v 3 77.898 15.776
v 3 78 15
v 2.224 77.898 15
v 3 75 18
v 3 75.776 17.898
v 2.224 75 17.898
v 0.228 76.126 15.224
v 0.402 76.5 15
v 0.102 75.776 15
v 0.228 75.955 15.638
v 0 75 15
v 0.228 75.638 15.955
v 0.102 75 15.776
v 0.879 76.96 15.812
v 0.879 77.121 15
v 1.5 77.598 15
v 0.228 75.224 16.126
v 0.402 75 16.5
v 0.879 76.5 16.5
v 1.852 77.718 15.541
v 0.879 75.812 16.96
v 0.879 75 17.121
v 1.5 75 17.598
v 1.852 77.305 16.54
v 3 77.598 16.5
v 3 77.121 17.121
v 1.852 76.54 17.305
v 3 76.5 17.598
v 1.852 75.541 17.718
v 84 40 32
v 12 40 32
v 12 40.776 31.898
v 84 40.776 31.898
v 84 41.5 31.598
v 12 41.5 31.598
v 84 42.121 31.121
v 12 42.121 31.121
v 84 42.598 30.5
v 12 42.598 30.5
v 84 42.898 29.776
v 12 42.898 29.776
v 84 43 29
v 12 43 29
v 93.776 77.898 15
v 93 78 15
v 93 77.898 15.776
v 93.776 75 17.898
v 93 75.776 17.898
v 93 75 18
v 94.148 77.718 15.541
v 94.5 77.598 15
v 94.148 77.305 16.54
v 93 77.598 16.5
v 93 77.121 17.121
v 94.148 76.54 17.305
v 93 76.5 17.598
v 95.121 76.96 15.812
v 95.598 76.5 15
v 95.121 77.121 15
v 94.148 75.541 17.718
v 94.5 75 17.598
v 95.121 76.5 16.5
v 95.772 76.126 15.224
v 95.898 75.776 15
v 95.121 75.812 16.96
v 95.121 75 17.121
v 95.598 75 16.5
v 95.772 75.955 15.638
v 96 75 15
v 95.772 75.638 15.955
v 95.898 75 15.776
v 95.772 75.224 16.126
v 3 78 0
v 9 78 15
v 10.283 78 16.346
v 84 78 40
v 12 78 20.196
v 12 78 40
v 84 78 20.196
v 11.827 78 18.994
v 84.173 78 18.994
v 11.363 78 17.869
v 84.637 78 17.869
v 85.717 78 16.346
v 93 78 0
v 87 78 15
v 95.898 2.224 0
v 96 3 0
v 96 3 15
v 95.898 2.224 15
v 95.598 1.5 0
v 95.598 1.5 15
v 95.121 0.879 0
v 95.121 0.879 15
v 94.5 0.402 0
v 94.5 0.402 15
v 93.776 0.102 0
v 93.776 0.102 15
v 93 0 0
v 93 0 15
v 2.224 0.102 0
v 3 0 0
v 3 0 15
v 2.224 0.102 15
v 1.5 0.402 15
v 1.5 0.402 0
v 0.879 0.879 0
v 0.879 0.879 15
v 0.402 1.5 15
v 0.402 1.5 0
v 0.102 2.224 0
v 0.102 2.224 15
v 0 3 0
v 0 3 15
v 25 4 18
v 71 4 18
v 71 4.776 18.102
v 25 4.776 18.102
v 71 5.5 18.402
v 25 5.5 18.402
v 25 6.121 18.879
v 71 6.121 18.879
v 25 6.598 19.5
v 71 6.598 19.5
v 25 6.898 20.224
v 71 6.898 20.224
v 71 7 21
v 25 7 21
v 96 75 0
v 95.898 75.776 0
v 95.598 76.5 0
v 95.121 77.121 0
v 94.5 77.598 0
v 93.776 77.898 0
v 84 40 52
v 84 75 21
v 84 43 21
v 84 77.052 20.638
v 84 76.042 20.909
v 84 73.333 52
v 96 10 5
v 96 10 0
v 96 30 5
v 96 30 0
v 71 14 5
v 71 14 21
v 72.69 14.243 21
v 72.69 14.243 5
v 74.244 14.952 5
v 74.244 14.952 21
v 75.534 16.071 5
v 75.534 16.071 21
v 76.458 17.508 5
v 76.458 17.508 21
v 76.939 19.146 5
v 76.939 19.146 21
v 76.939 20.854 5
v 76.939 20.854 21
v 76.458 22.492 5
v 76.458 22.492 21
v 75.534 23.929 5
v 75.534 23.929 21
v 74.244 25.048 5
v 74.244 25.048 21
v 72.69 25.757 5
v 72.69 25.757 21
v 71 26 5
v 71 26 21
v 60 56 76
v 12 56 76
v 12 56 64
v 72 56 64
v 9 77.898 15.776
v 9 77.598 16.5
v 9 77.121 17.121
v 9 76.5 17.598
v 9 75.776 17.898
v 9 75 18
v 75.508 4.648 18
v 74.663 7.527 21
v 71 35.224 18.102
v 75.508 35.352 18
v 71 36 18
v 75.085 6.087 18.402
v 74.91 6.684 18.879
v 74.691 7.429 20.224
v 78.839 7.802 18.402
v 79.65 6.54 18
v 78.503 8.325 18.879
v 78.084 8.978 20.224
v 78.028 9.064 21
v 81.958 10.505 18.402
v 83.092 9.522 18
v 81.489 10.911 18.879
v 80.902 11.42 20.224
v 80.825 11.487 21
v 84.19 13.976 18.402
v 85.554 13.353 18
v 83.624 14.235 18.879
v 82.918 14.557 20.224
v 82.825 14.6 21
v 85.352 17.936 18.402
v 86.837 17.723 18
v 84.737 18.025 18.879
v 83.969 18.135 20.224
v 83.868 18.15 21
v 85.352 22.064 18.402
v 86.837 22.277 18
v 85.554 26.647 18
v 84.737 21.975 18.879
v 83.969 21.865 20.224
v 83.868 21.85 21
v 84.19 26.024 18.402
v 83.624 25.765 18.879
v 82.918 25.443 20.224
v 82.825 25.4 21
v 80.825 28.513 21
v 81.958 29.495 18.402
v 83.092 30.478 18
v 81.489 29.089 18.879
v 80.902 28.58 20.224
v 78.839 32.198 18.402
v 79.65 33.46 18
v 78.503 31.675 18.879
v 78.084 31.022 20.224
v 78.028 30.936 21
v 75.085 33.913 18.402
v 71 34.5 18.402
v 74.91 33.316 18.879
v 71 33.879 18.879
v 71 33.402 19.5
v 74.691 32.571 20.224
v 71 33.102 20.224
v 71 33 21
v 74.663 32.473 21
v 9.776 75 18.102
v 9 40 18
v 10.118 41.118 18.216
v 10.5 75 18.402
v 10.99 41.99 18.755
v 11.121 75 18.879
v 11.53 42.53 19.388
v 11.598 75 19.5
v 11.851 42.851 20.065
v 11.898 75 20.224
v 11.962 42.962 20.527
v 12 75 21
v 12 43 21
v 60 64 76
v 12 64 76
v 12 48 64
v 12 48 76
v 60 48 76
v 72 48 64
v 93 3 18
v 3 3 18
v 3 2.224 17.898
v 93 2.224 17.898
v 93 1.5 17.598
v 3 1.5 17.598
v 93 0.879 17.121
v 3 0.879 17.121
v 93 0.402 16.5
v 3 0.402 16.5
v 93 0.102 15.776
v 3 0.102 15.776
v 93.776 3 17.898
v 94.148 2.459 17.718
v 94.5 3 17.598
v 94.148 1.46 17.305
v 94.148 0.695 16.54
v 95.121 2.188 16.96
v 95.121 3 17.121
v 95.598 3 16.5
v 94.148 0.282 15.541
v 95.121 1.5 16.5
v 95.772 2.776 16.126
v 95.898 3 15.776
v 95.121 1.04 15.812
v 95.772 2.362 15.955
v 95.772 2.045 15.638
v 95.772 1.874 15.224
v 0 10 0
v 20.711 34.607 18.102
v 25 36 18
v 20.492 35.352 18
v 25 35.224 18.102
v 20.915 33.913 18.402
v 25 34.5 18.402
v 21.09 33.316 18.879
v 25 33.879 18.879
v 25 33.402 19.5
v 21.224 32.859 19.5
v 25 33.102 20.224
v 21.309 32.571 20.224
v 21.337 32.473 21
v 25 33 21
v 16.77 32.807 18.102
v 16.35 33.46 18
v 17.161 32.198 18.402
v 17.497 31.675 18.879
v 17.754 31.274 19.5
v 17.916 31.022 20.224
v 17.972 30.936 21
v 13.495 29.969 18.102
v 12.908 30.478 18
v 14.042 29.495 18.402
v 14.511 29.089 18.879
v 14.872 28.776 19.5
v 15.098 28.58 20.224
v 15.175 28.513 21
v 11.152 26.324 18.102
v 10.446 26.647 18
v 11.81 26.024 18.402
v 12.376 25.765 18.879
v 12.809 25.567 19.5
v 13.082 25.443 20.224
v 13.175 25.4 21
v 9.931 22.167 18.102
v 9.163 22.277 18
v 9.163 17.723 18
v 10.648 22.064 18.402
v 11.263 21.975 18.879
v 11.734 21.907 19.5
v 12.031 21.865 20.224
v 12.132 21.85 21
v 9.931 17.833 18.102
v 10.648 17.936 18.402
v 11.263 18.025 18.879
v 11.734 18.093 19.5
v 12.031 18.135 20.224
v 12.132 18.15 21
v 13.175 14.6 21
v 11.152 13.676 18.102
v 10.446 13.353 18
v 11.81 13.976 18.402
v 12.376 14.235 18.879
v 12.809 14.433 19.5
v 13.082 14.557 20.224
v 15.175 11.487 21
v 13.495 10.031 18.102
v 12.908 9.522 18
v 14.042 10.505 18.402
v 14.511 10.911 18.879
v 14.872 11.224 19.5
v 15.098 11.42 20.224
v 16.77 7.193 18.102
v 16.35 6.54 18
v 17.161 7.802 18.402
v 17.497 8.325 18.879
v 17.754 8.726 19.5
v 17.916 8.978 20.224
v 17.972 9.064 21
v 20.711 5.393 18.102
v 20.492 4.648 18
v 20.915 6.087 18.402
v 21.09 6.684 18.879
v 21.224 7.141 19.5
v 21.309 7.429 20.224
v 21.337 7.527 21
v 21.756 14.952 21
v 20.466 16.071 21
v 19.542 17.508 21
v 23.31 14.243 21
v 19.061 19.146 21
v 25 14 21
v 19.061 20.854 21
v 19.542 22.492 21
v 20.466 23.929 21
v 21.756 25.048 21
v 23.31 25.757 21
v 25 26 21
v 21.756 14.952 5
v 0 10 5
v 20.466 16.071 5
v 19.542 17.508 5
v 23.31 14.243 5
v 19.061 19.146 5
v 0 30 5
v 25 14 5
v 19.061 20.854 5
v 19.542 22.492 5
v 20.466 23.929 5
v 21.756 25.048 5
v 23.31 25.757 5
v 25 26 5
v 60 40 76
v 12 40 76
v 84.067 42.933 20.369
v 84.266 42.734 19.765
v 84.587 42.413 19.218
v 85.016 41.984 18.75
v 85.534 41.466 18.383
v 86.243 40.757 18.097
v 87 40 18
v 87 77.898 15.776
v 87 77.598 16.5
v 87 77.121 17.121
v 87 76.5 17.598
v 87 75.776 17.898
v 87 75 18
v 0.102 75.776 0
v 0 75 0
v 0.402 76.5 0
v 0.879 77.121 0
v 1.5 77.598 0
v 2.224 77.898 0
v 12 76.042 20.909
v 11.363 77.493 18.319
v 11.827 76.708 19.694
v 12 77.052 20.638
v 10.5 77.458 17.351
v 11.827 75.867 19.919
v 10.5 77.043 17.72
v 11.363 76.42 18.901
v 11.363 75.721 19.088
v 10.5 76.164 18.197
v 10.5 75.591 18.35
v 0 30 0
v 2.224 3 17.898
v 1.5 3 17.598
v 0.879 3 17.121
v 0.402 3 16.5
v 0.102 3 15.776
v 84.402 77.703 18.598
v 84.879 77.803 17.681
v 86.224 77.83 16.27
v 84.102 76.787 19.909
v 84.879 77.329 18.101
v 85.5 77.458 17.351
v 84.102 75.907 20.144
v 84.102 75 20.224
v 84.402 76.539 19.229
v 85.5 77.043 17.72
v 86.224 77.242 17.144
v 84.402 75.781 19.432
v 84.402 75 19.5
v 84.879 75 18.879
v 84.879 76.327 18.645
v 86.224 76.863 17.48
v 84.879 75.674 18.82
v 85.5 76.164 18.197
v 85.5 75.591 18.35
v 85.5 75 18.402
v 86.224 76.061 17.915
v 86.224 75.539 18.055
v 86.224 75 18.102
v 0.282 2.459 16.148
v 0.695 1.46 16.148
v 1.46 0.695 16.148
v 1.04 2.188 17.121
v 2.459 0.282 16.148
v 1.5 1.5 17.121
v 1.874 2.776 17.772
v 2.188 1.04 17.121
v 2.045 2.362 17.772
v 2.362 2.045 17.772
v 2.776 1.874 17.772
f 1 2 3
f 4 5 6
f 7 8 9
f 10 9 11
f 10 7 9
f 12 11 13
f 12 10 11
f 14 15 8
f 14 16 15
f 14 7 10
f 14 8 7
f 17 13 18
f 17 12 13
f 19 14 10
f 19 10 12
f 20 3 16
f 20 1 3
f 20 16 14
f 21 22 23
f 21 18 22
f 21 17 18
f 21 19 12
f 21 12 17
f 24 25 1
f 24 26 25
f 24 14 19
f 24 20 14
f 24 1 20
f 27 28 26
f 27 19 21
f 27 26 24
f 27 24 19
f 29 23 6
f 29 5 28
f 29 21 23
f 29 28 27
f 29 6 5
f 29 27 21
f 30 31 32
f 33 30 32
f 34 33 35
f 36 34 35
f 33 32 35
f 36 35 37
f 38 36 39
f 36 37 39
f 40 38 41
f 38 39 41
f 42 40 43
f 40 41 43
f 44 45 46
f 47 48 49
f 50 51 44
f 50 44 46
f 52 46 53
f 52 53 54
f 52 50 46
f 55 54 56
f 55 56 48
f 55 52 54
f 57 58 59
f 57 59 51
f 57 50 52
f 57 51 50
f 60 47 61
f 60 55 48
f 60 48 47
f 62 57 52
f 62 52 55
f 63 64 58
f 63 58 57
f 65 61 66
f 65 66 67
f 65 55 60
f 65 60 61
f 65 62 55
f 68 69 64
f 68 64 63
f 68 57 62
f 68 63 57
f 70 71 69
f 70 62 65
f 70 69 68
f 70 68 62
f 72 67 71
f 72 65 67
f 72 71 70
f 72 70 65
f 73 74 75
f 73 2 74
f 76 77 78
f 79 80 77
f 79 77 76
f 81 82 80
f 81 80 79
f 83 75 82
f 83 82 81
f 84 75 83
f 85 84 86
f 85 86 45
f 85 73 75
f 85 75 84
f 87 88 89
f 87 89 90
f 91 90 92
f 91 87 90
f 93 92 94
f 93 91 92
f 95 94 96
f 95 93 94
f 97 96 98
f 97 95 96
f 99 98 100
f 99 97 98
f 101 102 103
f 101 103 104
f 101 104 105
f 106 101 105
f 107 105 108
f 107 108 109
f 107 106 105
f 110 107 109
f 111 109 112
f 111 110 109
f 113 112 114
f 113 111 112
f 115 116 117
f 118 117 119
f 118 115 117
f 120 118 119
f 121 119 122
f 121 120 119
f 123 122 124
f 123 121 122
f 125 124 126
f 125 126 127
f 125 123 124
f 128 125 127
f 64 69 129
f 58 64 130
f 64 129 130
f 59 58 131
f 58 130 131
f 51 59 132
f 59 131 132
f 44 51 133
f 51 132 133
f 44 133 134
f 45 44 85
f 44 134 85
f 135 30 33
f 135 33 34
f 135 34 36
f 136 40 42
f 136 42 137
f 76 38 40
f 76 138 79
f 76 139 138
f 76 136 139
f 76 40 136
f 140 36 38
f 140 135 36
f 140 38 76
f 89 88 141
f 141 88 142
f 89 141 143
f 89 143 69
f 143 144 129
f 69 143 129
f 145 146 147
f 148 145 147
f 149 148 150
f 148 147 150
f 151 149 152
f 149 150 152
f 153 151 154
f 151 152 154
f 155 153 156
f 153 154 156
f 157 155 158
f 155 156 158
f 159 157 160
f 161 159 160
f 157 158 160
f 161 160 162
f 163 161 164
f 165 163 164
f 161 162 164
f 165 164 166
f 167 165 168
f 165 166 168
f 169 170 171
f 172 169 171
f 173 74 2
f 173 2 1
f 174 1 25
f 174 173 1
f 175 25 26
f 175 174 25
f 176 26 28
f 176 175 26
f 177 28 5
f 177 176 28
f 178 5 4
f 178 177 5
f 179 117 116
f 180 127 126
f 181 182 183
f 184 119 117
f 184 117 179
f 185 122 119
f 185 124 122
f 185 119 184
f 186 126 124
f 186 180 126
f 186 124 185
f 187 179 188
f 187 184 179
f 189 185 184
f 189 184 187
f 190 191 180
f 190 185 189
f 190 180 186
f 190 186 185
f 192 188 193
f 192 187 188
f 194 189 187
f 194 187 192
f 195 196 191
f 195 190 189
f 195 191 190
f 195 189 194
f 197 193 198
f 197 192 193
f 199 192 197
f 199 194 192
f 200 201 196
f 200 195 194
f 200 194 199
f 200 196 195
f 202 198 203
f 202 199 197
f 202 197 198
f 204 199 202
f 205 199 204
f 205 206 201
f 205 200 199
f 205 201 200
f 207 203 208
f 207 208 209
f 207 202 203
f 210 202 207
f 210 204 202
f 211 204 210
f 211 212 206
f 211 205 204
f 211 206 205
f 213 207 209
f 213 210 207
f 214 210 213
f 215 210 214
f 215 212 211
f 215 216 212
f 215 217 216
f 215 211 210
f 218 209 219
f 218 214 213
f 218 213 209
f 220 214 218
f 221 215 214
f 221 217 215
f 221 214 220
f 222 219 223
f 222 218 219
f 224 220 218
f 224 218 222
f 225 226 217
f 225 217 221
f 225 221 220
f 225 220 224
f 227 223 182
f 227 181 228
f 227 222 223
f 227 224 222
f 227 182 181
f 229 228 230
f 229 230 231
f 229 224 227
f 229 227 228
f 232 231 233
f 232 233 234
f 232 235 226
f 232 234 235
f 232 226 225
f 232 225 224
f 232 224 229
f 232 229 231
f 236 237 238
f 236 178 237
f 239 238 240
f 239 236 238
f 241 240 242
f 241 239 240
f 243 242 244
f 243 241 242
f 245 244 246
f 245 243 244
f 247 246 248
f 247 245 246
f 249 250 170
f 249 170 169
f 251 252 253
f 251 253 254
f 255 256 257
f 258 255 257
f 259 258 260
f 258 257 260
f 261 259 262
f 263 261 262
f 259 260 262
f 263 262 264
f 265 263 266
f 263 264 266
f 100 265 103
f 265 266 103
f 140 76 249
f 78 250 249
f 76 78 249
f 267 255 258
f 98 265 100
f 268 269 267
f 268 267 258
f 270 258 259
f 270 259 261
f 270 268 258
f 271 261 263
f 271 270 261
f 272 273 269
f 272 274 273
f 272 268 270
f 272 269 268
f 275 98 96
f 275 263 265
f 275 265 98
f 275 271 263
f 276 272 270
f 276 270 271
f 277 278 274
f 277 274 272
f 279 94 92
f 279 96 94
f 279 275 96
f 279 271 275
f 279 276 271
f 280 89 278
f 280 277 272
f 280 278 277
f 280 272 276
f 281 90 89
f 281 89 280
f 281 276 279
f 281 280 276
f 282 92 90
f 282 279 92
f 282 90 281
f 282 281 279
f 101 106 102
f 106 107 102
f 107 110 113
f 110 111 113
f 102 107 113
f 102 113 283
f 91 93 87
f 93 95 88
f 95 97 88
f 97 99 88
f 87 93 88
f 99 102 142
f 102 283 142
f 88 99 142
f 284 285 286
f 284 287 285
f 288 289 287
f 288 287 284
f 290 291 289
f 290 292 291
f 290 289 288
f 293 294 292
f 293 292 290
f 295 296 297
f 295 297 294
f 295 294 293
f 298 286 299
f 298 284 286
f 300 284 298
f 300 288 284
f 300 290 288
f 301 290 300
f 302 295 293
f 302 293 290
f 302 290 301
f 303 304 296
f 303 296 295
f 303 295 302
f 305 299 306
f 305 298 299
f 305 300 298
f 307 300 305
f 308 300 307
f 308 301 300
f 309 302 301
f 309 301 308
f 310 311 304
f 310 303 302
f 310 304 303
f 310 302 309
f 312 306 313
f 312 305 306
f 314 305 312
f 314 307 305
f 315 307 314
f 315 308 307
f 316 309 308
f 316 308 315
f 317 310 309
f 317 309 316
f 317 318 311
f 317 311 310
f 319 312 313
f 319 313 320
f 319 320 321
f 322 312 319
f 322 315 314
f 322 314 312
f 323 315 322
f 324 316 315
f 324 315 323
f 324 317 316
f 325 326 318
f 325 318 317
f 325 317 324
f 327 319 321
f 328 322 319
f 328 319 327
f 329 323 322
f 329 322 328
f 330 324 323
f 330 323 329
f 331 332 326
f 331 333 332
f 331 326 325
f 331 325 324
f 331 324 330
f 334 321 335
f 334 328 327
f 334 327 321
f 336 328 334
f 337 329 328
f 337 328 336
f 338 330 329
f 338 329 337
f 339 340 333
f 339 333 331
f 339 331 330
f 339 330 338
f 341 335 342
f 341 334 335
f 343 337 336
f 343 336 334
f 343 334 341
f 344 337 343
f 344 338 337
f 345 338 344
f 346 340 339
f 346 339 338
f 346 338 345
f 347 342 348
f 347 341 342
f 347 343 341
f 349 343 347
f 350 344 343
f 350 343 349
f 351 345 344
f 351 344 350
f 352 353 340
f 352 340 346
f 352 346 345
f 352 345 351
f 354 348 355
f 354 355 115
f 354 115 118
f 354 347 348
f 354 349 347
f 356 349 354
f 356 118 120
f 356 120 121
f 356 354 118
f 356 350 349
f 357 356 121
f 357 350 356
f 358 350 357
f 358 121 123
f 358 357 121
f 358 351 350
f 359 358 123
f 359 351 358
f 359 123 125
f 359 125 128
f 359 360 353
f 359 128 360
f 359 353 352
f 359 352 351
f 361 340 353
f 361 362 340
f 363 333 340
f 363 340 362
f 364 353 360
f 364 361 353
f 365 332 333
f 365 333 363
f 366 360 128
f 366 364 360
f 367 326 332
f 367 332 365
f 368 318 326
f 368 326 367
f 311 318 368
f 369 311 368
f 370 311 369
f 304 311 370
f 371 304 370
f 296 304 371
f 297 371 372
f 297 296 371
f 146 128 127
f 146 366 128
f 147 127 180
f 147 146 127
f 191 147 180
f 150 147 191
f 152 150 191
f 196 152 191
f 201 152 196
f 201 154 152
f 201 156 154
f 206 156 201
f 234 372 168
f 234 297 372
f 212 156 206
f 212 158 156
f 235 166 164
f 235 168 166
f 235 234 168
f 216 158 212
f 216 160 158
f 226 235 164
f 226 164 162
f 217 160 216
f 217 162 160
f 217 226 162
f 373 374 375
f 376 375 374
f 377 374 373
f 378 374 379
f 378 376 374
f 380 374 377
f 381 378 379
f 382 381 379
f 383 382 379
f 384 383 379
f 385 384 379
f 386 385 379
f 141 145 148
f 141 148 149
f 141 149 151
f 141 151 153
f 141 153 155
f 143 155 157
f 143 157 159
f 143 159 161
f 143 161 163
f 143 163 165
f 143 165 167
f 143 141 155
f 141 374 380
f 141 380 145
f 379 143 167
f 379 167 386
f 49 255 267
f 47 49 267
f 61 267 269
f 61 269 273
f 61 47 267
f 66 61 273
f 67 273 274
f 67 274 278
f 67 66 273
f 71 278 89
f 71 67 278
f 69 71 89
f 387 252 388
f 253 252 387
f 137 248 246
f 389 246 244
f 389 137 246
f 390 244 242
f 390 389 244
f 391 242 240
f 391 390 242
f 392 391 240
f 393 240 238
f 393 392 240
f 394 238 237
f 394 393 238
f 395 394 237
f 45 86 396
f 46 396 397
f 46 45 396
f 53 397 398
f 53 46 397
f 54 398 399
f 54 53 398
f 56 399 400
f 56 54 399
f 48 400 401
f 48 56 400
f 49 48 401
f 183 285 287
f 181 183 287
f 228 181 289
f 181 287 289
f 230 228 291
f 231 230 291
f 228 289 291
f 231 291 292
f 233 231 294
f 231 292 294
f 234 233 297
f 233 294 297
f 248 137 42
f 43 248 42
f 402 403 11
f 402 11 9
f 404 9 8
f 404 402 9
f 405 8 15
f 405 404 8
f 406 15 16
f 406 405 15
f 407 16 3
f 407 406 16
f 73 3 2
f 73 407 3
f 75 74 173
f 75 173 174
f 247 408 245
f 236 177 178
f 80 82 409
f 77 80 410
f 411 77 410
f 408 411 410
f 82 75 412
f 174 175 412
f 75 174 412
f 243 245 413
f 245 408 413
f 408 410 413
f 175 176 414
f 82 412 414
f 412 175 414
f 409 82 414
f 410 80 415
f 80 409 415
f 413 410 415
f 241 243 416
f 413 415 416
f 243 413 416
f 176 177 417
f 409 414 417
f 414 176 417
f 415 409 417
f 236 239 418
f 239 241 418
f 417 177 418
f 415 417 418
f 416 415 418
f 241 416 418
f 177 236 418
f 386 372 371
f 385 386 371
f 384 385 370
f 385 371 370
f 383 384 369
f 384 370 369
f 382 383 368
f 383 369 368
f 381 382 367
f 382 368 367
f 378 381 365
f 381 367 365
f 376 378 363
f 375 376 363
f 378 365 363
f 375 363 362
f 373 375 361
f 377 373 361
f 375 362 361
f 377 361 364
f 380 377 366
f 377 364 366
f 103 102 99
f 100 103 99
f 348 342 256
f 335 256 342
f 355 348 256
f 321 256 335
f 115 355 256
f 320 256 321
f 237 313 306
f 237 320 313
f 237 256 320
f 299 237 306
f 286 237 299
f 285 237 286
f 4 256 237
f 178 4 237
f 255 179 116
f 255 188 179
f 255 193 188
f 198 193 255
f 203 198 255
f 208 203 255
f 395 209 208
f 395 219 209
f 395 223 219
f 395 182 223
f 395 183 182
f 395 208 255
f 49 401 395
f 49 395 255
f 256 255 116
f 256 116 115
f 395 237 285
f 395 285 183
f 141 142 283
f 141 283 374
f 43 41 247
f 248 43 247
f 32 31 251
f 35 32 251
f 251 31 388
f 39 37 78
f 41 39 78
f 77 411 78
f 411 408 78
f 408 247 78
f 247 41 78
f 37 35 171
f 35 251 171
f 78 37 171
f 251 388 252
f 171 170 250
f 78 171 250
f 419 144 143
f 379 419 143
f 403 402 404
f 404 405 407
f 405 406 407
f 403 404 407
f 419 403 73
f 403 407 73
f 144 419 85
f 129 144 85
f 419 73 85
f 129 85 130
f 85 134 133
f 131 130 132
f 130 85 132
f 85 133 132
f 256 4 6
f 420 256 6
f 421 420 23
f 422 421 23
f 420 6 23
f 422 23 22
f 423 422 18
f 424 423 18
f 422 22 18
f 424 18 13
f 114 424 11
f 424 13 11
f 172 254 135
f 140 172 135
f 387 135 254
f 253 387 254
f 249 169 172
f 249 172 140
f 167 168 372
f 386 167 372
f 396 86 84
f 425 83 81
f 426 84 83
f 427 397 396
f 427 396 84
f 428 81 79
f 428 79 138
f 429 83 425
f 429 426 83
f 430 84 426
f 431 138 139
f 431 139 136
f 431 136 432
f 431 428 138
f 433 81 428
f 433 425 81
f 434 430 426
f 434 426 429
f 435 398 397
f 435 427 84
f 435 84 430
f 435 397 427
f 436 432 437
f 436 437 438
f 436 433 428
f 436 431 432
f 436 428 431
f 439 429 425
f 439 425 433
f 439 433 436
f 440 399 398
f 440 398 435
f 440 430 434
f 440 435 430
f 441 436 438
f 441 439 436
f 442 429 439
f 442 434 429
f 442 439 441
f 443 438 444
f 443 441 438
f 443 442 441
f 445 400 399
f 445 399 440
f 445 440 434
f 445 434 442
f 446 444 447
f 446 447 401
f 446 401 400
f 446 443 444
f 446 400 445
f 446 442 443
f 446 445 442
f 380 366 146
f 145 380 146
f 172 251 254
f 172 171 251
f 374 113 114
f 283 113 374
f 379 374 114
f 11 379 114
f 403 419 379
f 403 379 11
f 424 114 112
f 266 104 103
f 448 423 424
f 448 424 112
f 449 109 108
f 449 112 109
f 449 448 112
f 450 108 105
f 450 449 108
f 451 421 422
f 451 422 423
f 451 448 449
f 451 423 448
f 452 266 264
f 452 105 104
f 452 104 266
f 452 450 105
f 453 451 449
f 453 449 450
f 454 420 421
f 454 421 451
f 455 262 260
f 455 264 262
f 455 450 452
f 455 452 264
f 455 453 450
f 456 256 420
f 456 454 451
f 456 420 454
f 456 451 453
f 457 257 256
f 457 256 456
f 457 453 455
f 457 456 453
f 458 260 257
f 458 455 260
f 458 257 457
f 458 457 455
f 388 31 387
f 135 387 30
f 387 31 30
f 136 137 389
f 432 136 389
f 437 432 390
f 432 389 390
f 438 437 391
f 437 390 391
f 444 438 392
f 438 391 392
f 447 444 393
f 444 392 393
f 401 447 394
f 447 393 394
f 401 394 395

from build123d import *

# Parameters (mm, degrees)
F0_W          = 96
F0_H          = 78
F1_DEPTH      = 18
F2_W          = 72
F2_H          = 38
F3_DEPTH      = 58
F4_R          = 3
F5_W          = 72
F5_H          = 8
F6_DEPTH      = 12
F7_C1_SIZE    = 24
F8_SIZE2      = 14
F8_SIZE       = 36
F9_W          = 3
F9_H          = 14
F10_DEPTH     = 72
F11_W         = 20
F11_H         = 5
F12_DEPTH     = 96
F14_DEPTH     = 3
F16_DEPTH     = 16
F17_T1_DEPTH  = 72
F17_T3_DEPTH  = 32
F17_T5_DEPTH  = 46
F17_T8_ANGLE  = 180
F17_T10_ANGLE = 180
F17_T14_ANGLE = 233.2969892374
F17_T19_ANGLE = 233.2969892374
F17_T25_DEPTH = 39.5
F17_T29_DEPTH = 79.5
F17_T36_DEPTH = 79.5
F17_T40_DEPTH = 39.5
F17_T43_DEPTH = 22.5
F17_T45_DEPTH = 90
F17_T47_DEPTH = 72
F17_S51_W     = 3.06
F17_S51_H     = 3.06
F17_T52_DEPTH = 3.06
F17_S57_W     = 3.06
F17_S57_H     = 3.06
F17_T58_DEPTH = 3.06
F17_T62_ANGLE = 90
F17_T64_ANGLE = 90


# Not quite as in the source:
# - a fillet or chamfer that OpenCascade refuses, or shapes differently, is made with other operations: its cross-section is extruded or revolved along the edge and cut away or added


with BuildPart() as f1:
    # F0 (on Top) → F1 (new body)
    with BuildSketch(Plane.XY):
        with Locations((48, 39)):
            Rectangle(F0_W, F0_H)
    extrude(amount=F1_DEPTH)

    # F2 (on face) → F3 (join)
    with BuildSketch(Plane.XY.offset(18)):
        with Locations((48, 59)):
            Rectangle(F2_W, F2_H)
    extrude(amount=F3_DEPTH)

    # F4
    f4_edges = [f1.edges().sort_by_distance(p)[0] for p in [
        (90, 78, 18),
        (6, 78, 18),
    ]]
    fillet(f4_edges, radius=F4_R)

    # F5 (on face) → F6 (cut)
    with BuildSketch(Plane.XY.offset(76)):
        with Locations((48, 52)):
            Rectangle(F5_W, F5_H)
    extrude(amount=-F6_DEPTH, mode=Mode.SUBTRACT)

    # F7: chamfer of 24 on 2 edges, made by hand

    # F7_c1
    f7_c1_edges = [f1.edges().sort_by_distance(p)[0] for p in [
        (84, 44, 76),
    ]]
    chamfer(f7_c1_edges, length=F7_C1_SIZE)

    # F8
    f8_edges = [f1.edges().sort_by_distance(p)[0] for p in [
        (36, 78, 76),
    ]]
    f8_side = f1.faces().sort_by_distance((46.545455, 78, 34.461039))[0]
    chamfer(f8_edges, length=F8_SIZE, length2=F8_SIZE2, reference=f8_side)

    # F9 (on face) → F10 (cut, through all)
    with BuildSketch(Plane.YZ.offset(84)):
        with Locations((41.5, 25)):
            Rectangle(F9_W, F9_H)
    extrude(amount=-F10_DEPTH, mode=Mode.SUBTRACT)

    # F11 (on face) → F12 (cut, through all)
    with BuildSketch(Plane.YZ.offset(96)):
        with Locations((20, 2.5)):
            Rectangle(F11_W, F11_H)
    extrude(amount=-F12_DEPTH, mode=Mode.SUBTRACT)

    # F13 (on face) → F14 (join)
    with BuildSketch(Plane.XY.offset(18)):
        with BuildLine():
            ThreePointArc((71, 7), (84, 20), (71, 33))
            Line((71, 33), (25, 33))
            ThreePointArc((25, 33), (12, 20), (25, 7))
            Line((25, 7), (71, 7))
        make_face()
    extrude(amount=F14_DEPTH)

    # F15 (on face) → F16 (cut, through all)
    with BuildSketch(Plane.XY.offset(21)):
        with BuildLine():
            ThreePointArc((25, 26), (19, 20), (25, 14))
            Line((25, 14), (71, 14))
            ThreePointArc((71, 14), (77, 20), (71, 26))
            Line((71, 26), (25, 26))
        make_face()
    extrude(amount=-F16_DEPTH, mode=Mode.SUBTRACT)

    # F17: fillet of radius 3 on 17 edges, made by hand

    # F17_s2 → F17_t1 (join)
    with BuildSketch(Plane.YZ.offset(12)):
        with BuildLine():
            ThreePointArc((40, 32), (42.1213203436, 31.1213203436), (43, 29))
            Line((43, 29), (43, 32))
            Line((43, 32), (40, 32))
        make_face()
        with BuildLine():
            ThreePointArc((43, 21), (42.1213203436, 18.8786796564), (40, 18))
            Line((40, 18), (43, 18))
            Line((43, 18), (43, 21))
        make_face()
    extrude(amount=F17_T1_DEPTH)

    # F17_s4 → F17_t3 (join)
    with BuildSketch(Plane.XZ.offset(-75)):
        with BuildLine():
            ThreePointArc((84, 21), (84.8786796564, 18.8786796564), (87, 18))
            Line((87, 18), (84, 18))
            Line((84, 18), (84, 21))
        make_face()
        with BuildLine():
            ThreePointArc((9, 18), (11.1213203436, 18.8786796564), (12, 21))
            Line((12, 21), (12, 18))
            Line((12, 18), (9, 18))
        make_face()
    extrude(amount=F17_T3_DEPTH)

    # F17_s6 → F17_t5 (join)
    with BuildSketch(Plane.YZ.offset(25)):
        with BuildLine():
            ThreePointArc((4, 18), (6.1213203436, 18.8786796564), (7, 21))
            Line((7, 21), (7, 18))
            Line((7, 18), (4, 18))
        make_face()
        with BuildLine():
            ThreePointArc((36, 18), (33.8786796564, 18.8786796564), (33, 21))
            Line((33, 21), (33, 18))
            Line((33, 18), (36, 18))
        make_face()
    extrude(amount=F17_T5_DEPTH)

    # F17_s7 → F17_t8 (revolve)
    with BuildSketch(Plane.YZ.offset(25)):
        with BuildLine():
            ThreePointArc((36, 18), (33.8786796564, 18.8786796564), (33, 21))
            Line((33, 21), (33, 18))
            Line((33, 18), (36, 18))
        make_face()
    revolve(axis=Axis((25, 20, 18), (0, 0, 1)), revolution_arc=F17_T8_ANGLE)

    # F17_s9 → F17_t10 (revolve)
    with BuildSketch(Plane.YZ.offset(71)):
        with BuildLine():
            ThreePointArc((4, 18), (6.1213203436, 18.8786796564), (7, 21))
            Line((7, 21), (7, 18))
            Line((7, 18), (4, 18))
        make_face()
    revolve(axis=Axis((71, 20, 18), (0, 0, 1)), revolution_arc=F17_T10_ANGLE)


with BuildPart() as f17_tool12:
    # F17_s13 → F17_t14 (revolve)
    with BuildSketch(Plane(origin=(0, 19.6028186536, -26.2963148857), x_dir=(1, 0, 0), z_dir=(0, -0.5976672776, 0.8017442393))):
        with BuildLine():
            ThreePointArc((12, 63.0958271118), (11.1213203436, 65.2171474554), (9, 66.0958271118))
            Line((9, 66.0958271118), (12, 66.0958271118))
            Line((12, 66.0958271118), (12, 63.0958271118))
        make_face()
    revolve(axis=Axis((12, 75, 15), (1, 0, 0)), revolution_arc=F17_T14_ANGLE)

    split(bisect_by=Plane.XZ.offset(-78), keep=Keep.TOP)


with BuildPart() as f1_1:
    add(f1.part)

    # F17_t11: union F17_tool12
    add(f17_tool12.part)


with BuildPart() as f17_tool17:
    # F17_s18 → F17_t19 (revolve)
    with BuildSketch(Plane(origin=(0, 19.6028186536, -26.2963148857), x_dir=(1, 0, 0), z_dir=(0, -0.5976672776, 0.8017442393))):
        with BuildLine():
            ThreePointArc((84, 63.0958271118), (84.8786796564, 65.2171474554), (87, 66.0958271118))
            Line((87, 66.0958271118), (84, 66.0958271118))
            Line((84, 66.0958271118), (84, 63.0958271118))
        make_face()
    revolve(axis=Axis((84, 75, 15), (1, 0, 0)), revolution_arc=F17_T19_ANGLE)

    split(bisect_by=Plane.XZ.offset(-78), keep=Keep.TOP)


with BuildPart() as f1_2:
    add(f1_1.part)

    # F17_t16: union F17_tool17
    add(f17_tool17.part)


with BuildPart() as f17_tool23:
    # F17_s24 → F17_t25 (new body)
    with BuildSketch(Plane.XZ.offset(-35.5)):
        with BuildLine():
            ThreePointArc((84, 21), (84.8786796564, 18.8786796564), (87, 18))
            Line((87, 18), (84, 18))
            Line((84, 18), (84, 21))
        make_face()
    extrude(amount=-F17_T25_DEPTH)

    split(bisect_by=Plane.XZ.offset(-43), keep=Keep.TOP)


with BuildPart() as f17_tool27:
    # F17_s28 → F17_t29 (new body)
    with BuildSketch(Plane.YZ.offset(91.5)):
        with BuildLine():
            ThreePointArc((43, 21), (42.1213203436, 18.8786796564), (40, 18))
            Line((40, 18), (43, 18))
            Line((43, 18), (43, 21))
        make_face()
    extrude(amount=-F17_T29_DEPTH)

    split(bisect_by=Plane.YZ.offset(84), keep=Keep.TOP)


with BuildPart() as f17_tool23_1:
    add(f17_tool23.part)

    # F17_t31: intersect F17_tool27
    add(f17_tool27.part, mode=Mode.INTERSECT)


with BuildPart() as f1_3:
    add(f1_2.part)

    # F17_t21: union F17_tool23
    add(f17_tool23_1.part)


with BuildPart() as f17_tool34:
    # F17_s35 → F17_t36 (new body)
    with BuildSketch(Plane.YZ.offset(84)):
        with BuildLine():
            ThreePointArc((43, 21), (42.1213203436, 18.8786796564), (40, 18))
            Line((40, 18), (43, 18))
            Line((43, 18), (43, 21))
        make_face()
    extrude(amount=-F17_T36_DEPTH)

    split(bisect_by=Plane.YZ.offset(12), keep=Keep.BOTTOM)


with BuildPart() as f17_tool38:
    # F17_s39 → F17_t40 (new body)
    with BuildSketch(Plane.XZ.offset(-75)):
        with BuildLine():
            ThreePointArc((9, 18), (11.1213203436, 18.8786796564), (12, 21))
            Line((12, 21), (12, 18))
            Line((12, 18), (9, 18))
        make_face()
    extrude(amount=F17_T40_DEPTH)

    split(bisect_by=Plane.XZ.offset(-43), keep=Keep.TOP)


with BuildPart() as f17_tool34_1:
    add(f17_tool34.part)

    # F17_t42: intersect F17_tool38
    add(f17_tool38.part, mode=Mode.INTERSECT)


with BuildPart() as f1_4:
    add(f1_3.part)

    # F17_t32: union F17_tool34
    add(f17_tool34_1.part)

    # F17_s44 → F17_t43 (cut)
    with BuildSketch(Plane.XY.offset(-7.5)):
        with BuildLine():
            ThreePointArc((3, 0), (0.8786796564, 0.8786796564), (0, 3))
            Line((0, 3), (0, 0))
            Line((0, 0), (3, 0))
        make_face()
        with BuildLine():
            ThreePointArc((96, 3), (95.1213203436, 0.8786796564), (93, 0))
            Line((93, 0), (96, 0))
            Line((96, 0), (96, 3))
        make_face()
        with BuildLine():
            ThreePointArc((0, 75), (0.8786796564, 77.1213203436), (3, 78))
            Line((3, 78), (0, 78))
            Line((0, 78), (0, 75))
        make_face()
        with BuildLine():
            ThreePointArc((96, 75), (95.1213203436, 77.1213203436), (93, 78))
            Line((93, 78), (96, 78))
            Line((96, 78), (96, 75))
        make_face()
    extrude(amount=F17_T43_DEPTH, mode=Mode.SUBTRACT)

    # F17_s46 → F17_t45 (cut)
    with BuildSketch(Plane.YZ.offset(3)):
        with BuildLine():
            ThreePointArc((3, 18), (0.8786796564, 17.1213203436), (0, 15))
            Line((0, 15), (0, 18))
            Line((0, 18), (3, 18))
        make_face()
    extrude(amount=F17_T45_DEPTH, mode=Mode.SUBTRACT)

    # F17_s48 → F17_t47 (cut)
    with BuildSketch(Plane.XZ.offset(-75)):
        with BuildLine():
            ThreePointArc((3, 18), (0.8786796564, 17.1213203436), (0, 15))
            Line((0, 15), (0, 18))
            Line((0, 18), (3, 18))
        make_face()
        with BuildLine():
            ThreePointArc((93, 18), (95.1213203436, 17.1213203436), (96, 15))
            Line((96, 15), (96, 18))
            Line((96, 18), (93, 18))
        make_face()
    extrude(amount=F17_T47_DEPTH, mode=Mode.SUBTRACT)


with BuildPart() as f17_tool50:
    # F17_s51 → F17_t52 (new body)
    with BuildSketch(Plane.XY.offset(15)):
        with Locations((1.47, 1.47)):
            Rectangle(F17_S51_W, F17_S51_H)
    extrude(amount=F17_T52_DEPTH)

    # F17_s53 → F17_t54 (revolve, cut)
    with BuildSketch(Plane(origin=(3, 3, 15), x_dir=(0.7071067812, 0.7071067812, 0), z_dir=(0.7071067812, -0.7071067812, 0))):
        with BuildLine():
            ThreePointArc((0, -3), (3, 0), (0, 3))
            Line((0, 3), (0, -3))
        make_face()
    revolve(axis=Axis((3, 3, 15), (0, 0, 1)), mode=Mode.SUBTRACT)


with BuildPart() as f1_5:
    add(f1_4.part)

    # F17_t49: cut F17_tool50
    add(f17_tool50.part, mode=Mode.SUBTRACT)


with BuildPart() as f17_tool56:
    # F17_s57 → F17_t58 (new body)
    with BuildSketch(Plane.YZ.offset(93)):
        with Locations((1.47, 16.53)):
            Rectangle(F17_S57_W, F17_S57_H)
    extrude(amount=F17_T58_DEPTH)

    # F17_s59 → F17_t60 (revolve, cut)
    with BuildSketch(Plane(origin=(93, 3, 15), x_dir=(0, 0.7071067812, -0.7071067812), z_dir=(0, -0.7071067812, -0.7071067812))):
        with BuildLine():
            ThreePointArc((0, -3), (3, 0), (0, 3))
            Line((0, 3), (0, -3))
        make_face()
    revolve(axis=Axis((93, 3, 15), (1, 0, 0)), mode=Mode.SUBTRACT)


with BuildPart() as f1_6:
    add(f1_5.part)

    # F17_t55: cut F17_tool56
    add(f17_tool56.part, mode=Mode.SUBTRACT)

    # F17_s61 → F17_t62 (revolve, cut)
    with BuildSketch(Plane.XY.offset(15)):
        with BuildLine():
            ThreePointArc((93, 78), (95.1213203436, 77.1213203436), (96, 75))
            Line((96, 75), (96, 78))
            Line((96, 78), (93, 78))
        make_face()
    revolve(axis=Axis((96, 75, 15), (1, 0, 0)), revolution_arc=F17_T62_ANGLE, mode=Mode.SUBTRACT)

    # F17_s63 → F17_t64 (revolve, cut)
    with BuildSketch(Plane.XY.offset(15)):
        with BuildLine():
            ThreePointArc((0, 75), (0.8786796564, 77.1213203436), (3, 78))
            Line((3, 78), (0, 78))
            Line((0, 78), (0, 75))
        make_face()
    revolve(axis=Axis((0, 75, 15), (1, 0, 0)), revolution_arc=F17_T64_ANGLE, mode=Mode.SUBTRACT)


solid = f1_6.part
